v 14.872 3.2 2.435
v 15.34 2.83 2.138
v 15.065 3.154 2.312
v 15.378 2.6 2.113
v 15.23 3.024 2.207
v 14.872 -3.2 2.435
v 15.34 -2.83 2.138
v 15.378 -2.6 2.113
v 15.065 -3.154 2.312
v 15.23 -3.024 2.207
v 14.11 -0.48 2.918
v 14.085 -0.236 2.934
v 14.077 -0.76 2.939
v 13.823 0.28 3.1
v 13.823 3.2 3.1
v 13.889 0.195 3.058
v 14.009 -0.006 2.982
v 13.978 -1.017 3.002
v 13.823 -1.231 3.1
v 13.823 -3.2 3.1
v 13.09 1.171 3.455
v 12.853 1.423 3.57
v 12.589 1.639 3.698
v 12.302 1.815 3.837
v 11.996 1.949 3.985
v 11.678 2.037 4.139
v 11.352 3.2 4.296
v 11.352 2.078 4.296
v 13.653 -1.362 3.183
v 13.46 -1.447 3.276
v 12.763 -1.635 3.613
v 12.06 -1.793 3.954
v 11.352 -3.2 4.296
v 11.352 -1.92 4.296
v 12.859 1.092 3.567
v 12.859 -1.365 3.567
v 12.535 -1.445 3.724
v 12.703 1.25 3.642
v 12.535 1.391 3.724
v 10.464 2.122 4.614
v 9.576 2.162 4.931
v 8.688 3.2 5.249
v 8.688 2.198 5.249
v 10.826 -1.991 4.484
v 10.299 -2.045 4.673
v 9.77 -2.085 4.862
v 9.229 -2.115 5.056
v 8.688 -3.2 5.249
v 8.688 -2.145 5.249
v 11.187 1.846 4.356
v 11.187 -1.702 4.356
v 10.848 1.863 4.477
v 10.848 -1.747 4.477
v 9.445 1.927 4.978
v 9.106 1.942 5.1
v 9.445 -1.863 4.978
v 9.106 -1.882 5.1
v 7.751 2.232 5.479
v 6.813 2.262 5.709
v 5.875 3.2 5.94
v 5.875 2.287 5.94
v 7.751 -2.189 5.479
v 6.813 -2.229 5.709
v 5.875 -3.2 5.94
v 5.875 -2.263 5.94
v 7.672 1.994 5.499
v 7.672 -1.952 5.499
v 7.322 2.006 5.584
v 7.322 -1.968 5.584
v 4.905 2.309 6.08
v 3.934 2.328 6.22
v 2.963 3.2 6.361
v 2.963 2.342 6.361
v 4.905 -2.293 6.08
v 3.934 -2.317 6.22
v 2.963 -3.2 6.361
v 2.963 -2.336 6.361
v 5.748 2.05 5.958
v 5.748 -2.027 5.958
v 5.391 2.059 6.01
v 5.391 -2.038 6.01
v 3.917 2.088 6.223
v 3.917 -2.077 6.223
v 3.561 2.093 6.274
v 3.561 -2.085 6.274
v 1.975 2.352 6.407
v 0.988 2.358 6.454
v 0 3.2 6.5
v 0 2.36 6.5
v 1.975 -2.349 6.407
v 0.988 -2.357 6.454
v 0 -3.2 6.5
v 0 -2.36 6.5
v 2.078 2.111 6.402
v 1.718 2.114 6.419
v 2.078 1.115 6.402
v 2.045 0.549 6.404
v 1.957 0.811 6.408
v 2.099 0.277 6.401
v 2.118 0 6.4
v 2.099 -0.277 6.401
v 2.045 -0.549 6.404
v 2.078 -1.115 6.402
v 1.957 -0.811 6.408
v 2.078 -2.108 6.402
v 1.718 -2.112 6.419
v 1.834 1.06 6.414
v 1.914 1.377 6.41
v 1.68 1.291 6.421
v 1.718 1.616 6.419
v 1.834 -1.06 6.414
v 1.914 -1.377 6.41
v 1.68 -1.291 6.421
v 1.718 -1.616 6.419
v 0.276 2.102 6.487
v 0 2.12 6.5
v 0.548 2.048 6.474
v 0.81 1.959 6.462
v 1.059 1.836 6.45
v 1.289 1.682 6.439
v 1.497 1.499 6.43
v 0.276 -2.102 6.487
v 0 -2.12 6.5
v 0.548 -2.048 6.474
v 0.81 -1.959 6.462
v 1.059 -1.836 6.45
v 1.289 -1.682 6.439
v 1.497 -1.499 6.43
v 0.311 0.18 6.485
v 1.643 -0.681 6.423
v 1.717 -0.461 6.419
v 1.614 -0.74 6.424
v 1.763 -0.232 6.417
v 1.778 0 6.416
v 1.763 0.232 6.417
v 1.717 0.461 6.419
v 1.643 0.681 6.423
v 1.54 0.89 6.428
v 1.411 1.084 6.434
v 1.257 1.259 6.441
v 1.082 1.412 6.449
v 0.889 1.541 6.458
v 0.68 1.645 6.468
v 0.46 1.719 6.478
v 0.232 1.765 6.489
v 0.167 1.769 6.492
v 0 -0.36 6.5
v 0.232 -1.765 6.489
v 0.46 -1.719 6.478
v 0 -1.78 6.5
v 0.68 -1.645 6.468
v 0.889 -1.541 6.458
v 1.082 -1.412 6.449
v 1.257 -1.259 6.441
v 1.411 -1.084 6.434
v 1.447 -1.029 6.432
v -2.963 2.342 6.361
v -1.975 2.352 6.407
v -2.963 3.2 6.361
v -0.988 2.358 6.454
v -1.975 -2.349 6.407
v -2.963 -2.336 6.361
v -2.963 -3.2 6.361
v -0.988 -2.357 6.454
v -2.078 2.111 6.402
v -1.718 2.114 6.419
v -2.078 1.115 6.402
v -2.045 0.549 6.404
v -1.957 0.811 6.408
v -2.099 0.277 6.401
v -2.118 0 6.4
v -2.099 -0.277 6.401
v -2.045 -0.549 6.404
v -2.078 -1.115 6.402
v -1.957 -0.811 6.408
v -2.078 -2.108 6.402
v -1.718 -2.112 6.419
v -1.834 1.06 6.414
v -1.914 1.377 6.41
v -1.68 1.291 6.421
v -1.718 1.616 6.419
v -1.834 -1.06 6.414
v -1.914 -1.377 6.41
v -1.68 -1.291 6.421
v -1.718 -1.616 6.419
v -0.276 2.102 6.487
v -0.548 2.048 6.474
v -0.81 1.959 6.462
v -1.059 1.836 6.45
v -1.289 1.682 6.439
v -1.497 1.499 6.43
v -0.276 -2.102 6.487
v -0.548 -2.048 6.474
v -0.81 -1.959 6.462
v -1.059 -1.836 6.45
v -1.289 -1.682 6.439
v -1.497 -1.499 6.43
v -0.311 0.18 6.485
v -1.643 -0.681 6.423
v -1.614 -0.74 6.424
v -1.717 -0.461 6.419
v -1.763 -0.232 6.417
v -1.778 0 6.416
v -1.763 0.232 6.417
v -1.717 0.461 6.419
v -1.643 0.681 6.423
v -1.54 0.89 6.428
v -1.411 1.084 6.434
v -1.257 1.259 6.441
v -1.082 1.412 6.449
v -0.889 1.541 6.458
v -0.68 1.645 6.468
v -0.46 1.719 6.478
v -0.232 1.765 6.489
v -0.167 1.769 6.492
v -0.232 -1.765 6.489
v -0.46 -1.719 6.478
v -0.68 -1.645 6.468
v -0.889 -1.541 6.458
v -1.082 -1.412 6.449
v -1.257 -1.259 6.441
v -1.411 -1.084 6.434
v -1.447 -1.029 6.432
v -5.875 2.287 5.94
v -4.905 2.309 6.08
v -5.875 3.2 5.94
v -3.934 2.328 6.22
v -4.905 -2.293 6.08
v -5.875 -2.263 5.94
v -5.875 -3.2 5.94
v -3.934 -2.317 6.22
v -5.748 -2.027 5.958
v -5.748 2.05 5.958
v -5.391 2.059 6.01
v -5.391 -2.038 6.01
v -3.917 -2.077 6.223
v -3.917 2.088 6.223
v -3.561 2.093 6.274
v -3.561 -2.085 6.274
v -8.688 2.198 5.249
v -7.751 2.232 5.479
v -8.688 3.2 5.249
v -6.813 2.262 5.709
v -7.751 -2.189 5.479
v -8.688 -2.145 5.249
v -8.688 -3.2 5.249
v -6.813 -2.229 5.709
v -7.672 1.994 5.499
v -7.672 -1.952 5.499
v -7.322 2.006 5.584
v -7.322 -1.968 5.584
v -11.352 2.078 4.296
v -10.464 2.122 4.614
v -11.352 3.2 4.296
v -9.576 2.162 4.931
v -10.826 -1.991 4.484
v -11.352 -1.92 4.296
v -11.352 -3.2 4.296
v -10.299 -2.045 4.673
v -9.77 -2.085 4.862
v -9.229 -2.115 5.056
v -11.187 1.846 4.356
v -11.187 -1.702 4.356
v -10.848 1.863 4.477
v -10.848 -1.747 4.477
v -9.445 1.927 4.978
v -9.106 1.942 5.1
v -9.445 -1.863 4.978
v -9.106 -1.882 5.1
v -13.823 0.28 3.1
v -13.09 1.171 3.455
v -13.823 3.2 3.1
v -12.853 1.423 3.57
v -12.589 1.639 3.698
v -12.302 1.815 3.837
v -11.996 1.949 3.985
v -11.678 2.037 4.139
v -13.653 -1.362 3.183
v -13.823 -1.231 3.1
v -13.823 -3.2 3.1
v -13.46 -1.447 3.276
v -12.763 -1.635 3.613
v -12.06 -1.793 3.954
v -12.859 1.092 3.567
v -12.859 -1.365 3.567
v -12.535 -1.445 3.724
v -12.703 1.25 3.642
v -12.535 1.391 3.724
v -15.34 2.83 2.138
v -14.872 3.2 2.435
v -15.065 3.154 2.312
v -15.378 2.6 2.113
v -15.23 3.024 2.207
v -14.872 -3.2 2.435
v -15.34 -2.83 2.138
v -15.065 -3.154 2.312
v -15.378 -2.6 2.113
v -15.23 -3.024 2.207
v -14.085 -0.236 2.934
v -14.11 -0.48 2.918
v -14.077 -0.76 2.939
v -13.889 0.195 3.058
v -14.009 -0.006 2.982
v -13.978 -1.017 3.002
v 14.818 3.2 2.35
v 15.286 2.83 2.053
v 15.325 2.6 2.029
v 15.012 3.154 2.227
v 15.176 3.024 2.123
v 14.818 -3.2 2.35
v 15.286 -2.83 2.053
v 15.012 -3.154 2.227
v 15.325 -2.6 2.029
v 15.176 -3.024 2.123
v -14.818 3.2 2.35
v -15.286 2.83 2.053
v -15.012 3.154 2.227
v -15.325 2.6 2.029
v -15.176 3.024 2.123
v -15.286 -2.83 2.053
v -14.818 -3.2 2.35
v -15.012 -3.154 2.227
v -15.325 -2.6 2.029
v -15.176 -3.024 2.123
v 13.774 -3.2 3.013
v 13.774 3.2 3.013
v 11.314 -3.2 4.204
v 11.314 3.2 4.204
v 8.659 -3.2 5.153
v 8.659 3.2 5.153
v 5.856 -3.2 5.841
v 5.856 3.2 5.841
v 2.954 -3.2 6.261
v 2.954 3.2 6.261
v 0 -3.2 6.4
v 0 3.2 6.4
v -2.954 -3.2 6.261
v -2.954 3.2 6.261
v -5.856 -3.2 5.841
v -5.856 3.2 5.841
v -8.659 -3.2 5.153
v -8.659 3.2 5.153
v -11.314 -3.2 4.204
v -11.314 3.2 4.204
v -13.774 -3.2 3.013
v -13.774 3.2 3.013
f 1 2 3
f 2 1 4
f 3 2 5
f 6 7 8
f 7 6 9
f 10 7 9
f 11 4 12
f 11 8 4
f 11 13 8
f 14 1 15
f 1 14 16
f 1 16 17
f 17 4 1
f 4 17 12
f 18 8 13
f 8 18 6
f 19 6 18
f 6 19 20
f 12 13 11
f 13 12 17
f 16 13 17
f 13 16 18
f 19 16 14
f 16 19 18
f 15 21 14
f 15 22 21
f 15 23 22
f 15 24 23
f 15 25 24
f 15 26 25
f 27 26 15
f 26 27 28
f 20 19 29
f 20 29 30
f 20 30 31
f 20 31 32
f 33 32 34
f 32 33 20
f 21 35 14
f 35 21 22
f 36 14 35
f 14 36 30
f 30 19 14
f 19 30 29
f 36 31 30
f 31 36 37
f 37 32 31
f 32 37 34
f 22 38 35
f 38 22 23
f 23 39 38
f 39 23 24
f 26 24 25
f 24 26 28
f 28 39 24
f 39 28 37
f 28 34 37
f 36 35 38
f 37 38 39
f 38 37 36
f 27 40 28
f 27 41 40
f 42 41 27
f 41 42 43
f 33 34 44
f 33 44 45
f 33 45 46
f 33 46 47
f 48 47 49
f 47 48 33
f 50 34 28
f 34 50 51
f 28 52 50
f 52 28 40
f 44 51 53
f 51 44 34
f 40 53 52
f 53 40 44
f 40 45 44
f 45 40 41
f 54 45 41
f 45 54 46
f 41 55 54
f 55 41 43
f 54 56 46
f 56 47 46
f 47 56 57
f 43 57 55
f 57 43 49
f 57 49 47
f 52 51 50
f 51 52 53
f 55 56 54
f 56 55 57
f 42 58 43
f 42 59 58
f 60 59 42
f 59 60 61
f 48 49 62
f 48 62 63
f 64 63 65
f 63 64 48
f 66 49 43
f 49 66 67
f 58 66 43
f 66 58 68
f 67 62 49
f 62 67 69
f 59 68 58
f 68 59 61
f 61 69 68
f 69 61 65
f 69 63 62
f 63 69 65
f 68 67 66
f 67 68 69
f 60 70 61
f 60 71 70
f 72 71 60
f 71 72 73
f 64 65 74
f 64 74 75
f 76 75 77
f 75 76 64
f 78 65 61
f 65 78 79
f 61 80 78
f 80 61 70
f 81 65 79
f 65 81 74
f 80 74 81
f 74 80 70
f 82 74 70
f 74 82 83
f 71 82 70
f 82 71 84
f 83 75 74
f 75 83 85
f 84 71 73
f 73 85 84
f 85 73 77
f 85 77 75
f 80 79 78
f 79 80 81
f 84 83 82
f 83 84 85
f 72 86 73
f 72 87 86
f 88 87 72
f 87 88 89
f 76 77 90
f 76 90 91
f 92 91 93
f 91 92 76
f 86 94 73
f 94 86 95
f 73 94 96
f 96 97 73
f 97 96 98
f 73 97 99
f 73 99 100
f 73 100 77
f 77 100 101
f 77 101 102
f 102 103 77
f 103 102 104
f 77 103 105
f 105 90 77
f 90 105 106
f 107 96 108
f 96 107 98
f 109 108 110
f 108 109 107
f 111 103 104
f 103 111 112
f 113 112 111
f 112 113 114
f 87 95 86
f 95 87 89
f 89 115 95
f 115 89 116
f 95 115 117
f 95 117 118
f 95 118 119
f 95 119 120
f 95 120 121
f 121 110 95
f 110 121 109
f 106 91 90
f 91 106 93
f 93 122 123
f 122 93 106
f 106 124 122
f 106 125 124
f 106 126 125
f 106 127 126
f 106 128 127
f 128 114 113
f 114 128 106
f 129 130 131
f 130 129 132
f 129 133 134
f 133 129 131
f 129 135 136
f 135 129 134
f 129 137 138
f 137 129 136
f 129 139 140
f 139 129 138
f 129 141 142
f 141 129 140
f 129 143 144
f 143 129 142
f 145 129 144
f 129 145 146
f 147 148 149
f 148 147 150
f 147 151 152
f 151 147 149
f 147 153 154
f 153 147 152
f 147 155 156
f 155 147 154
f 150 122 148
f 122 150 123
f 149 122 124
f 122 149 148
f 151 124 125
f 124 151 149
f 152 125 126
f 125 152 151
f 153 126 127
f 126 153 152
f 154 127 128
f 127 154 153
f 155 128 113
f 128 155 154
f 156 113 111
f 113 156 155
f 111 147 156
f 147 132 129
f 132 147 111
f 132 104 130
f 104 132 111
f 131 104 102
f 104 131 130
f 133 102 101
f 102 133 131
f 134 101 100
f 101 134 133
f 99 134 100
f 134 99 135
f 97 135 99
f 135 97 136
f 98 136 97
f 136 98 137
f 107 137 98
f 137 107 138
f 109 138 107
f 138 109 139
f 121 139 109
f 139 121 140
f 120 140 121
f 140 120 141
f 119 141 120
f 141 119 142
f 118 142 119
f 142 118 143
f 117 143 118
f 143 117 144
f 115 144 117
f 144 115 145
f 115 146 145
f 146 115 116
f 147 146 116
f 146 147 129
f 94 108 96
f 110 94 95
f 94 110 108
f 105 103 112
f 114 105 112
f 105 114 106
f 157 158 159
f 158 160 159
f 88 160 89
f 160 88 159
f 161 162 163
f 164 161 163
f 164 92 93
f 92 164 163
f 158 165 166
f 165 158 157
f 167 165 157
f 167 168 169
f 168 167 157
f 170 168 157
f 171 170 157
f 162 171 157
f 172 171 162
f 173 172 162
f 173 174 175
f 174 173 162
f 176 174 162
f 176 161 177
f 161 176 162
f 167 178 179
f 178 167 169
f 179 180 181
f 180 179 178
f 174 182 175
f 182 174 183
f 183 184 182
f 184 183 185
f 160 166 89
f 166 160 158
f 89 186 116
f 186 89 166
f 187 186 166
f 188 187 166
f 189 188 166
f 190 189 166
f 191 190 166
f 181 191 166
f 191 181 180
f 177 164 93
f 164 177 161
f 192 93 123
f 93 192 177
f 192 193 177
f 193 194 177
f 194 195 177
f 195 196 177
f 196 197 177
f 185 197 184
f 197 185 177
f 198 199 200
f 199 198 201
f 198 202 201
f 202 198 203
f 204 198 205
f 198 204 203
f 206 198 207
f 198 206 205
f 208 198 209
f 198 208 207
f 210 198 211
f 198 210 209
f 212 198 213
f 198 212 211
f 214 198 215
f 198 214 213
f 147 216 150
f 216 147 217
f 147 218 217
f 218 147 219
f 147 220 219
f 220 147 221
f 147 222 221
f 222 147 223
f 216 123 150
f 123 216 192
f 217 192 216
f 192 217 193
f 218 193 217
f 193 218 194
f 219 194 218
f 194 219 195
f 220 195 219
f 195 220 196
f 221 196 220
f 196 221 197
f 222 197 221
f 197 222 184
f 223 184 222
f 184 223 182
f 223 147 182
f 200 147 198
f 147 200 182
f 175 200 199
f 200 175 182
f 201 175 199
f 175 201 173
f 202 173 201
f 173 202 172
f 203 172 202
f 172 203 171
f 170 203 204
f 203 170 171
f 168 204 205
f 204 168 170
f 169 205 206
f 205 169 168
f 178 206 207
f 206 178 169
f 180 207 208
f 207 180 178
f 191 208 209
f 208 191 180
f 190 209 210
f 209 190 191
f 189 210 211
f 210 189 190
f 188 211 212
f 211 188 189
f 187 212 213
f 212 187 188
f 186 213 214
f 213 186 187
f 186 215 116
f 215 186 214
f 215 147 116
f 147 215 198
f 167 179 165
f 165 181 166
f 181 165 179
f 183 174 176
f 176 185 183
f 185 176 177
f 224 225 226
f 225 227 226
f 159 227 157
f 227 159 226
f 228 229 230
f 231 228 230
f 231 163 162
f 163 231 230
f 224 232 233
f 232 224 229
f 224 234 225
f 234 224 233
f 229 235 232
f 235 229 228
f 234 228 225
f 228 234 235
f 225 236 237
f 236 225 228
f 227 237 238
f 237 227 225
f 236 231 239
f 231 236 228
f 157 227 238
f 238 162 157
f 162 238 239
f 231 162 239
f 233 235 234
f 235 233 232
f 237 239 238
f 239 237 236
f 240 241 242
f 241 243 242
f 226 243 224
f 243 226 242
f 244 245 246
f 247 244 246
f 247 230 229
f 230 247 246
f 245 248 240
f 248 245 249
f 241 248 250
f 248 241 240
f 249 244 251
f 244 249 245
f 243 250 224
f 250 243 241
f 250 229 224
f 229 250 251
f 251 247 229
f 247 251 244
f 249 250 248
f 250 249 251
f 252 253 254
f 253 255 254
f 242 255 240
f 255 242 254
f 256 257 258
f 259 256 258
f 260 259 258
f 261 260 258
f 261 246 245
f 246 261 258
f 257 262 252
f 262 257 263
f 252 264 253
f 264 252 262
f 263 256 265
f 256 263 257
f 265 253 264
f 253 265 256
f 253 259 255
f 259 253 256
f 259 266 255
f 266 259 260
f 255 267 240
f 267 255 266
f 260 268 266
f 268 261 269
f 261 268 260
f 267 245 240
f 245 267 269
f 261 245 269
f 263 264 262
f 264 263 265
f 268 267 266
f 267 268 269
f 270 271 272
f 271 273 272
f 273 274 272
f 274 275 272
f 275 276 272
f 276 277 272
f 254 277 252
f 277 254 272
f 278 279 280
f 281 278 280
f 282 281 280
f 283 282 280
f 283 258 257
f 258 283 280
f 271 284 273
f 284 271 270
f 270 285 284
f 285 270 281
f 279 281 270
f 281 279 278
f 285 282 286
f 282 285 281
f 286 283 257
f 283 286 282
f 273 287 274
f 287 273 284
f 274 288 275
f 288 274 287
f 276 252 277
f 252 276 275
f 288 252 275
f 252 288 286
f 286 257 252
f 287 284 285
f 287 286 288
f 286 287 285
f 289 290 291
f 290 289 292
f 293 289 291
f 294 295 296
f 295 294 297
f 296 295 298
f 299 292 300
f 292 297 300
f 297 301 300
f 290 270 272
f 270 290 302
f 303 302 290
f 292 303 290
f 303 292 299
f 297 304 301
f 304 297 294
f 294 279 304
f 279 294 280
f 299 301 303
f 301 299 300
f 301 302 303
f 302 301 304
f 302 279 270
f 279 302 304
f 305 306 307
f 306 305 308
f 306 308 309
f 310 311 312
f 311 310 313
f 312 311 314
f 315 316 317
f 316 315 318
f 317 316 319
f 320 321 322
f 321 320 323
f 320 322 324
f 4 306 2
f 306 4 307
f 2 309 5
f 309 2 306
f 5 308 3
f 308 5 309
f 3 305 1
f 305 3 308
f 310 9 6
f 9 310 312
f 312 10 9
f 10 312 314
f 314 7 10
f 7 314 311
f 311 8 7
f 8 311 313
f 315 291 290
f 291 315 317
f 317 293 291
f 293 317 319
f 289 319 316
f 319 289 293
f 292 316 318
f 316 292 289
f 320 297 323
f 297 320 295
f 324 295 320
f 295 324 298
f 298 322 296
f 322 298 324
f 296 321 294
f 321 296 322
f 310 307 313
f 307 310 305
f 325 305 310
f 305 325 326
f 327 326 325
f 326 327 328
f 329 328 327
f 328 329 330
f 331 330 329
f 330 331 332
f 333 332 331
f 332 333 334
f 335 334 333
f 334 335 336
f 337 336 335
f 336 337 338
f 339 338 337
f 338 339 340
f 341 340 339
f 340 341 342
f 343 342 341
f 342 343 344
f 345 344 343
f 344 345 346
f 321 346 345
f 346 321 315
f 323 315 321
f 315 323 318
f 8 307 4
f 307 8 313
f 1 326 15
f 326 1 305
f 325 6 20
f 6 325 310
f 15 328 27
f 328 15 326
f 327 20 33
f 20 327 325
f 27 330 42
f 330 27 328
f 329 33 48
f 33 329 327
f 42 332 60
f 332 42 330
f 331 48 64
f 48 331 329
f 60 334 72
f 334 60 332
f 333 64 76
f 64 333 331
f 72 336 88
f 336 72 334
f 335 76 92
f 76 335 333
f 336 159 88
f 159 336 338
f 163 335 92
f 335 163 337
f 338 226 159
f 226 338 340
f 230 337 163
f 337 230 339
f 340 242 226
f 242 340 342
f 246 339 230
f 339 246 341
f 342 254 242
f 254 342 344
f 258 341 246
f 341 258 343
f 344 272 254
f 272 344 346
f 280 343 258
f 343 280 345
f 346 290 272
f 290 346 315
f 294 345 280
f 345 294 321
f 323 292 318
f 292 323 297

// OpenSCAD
// file: ../p/1-4cyli.scad
use <../lib.scad>
function ldraw_lib__1_4cyli() = [
// 0 Cylinder 0.25
// 0 Name: 1-4cyli.dat
// 0 Author: James Jessiman
// 0 !LDRAW_ORG Primitive UPDATE 2012-01
// 0 !LICENSE Licensed under CC BY 4.0 : see CAreadme.txt
// 
// 0 BFC CERTIFY CCW
  [0,"BFC","CERTIFY"],
  [0,"BFC","CCW"],
// 
// 0 !HISTORY 2002-03-23 [sbliss] Added BFC statement.
// 0 !HISTORY 2002-04-25 [PTadmin] Official Update 2002-02
// 0 !HISTORY 2007-06-22 [PTadmin] Header formatted for Contributor Agreement
// 0 !HISTORY 2008-07-01 [PTadmin] Official Update 2008-01
// 0 !HISTORY 2012-02-16 [Philo] Changed to CCW
// 0 !HISTORY 2012-03-30 [PTadmin] Official Update 2012-01
// 
// 
// 4 16 1 1 0 0.9239 1 0.3827 0.9239 0 0.3827 1 0 0
  [4,16,1,1,0,0.9239,1,0.3827,0.9239,0,0.3827,1,0,0],
// 5 24 1 0 0 1 1 0 0.9239 0 0.3827 1 0 -1
  [5,24,1,0,0,1,1,0,0.9239,0,0.3827,1,0,-1],
// 4 16 0.9239 1 0.3827 0.7071 1 0.7071 0.7071 0 0.7071 0.9239 0 0.3827
  [4,16,0.9239,1,0.3827,0.7071,1,0.7071,0.7071,0,0.7071,0.9239,0,0.3827],
// 5 24 0.9239 0 0.3827 0.9239 1 0.3827 0.7071 0 0.7071 1 0 0
  [5,24,0.9239,0,0.3827,0.9239,1,0.3827,0.7071,0,0.7071,1,0,0],
// 4 16 0.7071 1 0.7071 0.3827 1 0.9239 0.3827 0 0.9239 0.7071 0 0.7071
  [4,16,0.7071,1,0.7071,0.3827,1,0.9239,0.3827,0,0.9239,0.7071,0,0.7071],
// 5 24 0.7071 0 0.7071 0.7071 1 0.7071 0.3827 0 0.9239 0.9239 0 0.3827
  [5,24,0.7071,0,0.7071,0.7071,1,0.7071,0.3827,0,0.9239,0.9239,0,0.3827],
// 4 16 0.3827 1 0.9239 0 1 1 0 0 1 0.3827 0 0.9239
  [4,16,0.3827,1,0.9239,0,1,1,0,0,1,0.3827,0,0.9239],
// 5 24 0.3827 0 0.9239 0.3827 1 0.9239 0 0 1 0.7071 0 0.7071
  [5,24,0.3827,0,0.9239,0.3827,1,0.9239,0,0,1,0.7071,0,0.7071],
// 5 24 0 0 1 0 1 1 0.3827 0 0.9239 -1 0 1
  [5,24,0,0,1,0,1,1,0.3827,0,0.9239,-1,0,1],
];
module ldraw_lib__1_4cyli(step=0, col=false, unit=2/5, alt=false, line=0.2, solid=!$preview)
    makepoly(ldraw_lib__1_4cyli(), step=step, col=col, unit=unit, alt=alt, line=line, solid=solid);
ldraw_lib__1_4cyli(line=0.2);
// file: ../p/1-4chrd.scad
use <../lib.scad>
function ldraw_lib__1_4chrd() = [
// 0 Chord 0.25
// 0 Name: 1-4chrd.dat
// 0 Author: Max Martin Richter [MMR1988]
// 0 !LDRAW_ORG Primitive UPDATE 2023-05
// 0 !LICENSE Licensed under CC BY 4.0 : see CAreadme.txt
// 
// 0 BFC CERTIFY CCW
  [0,"BFC","CERTIFY"],
  [0,"BFC","CCW"],
// 
// 0 !HISTORY 2004-04-22 [PTadmin] Official Update 2004-02
// 0 !HISTORY 2007-10-09 [PTadmin] Header formatted for Contributor Agreement
// 0 !HISTORY 2008-07-01 [PTadmin] Official Update 2008-01
// 0 !HISTORY 2012-08-02 [MMR1988] Re-creation with PrimGen2 and Rectifier
// 0 !HISTORY 2012-08-09 [PTadmin] Official Update 2012-02
// 0 !HISTORY 2023-10-27 [OrionP] Change author to MMR1988 from hafhead
// 0 !HISTORY 2023-10-31 [OrionP] Official Update 2023-05
// 
// 4 16 0.9239 0 0.3827 0.3827 0 0.9239 0 0 1 1 0 0
  [4,16,0.9239,0,0.3827,0.3827,0,0.9239,0,0,1,1,0,0],
// 3 16 0.7071 0 0.7071 0.3827 0 0.9239 0.9239 0 0.3827
  [3,16,0.7071,0,0.7071,0.3827,0,0.9239,0.9239,0,0.3827],
];
module ldraw_lib__1_4chrd(step=0, col=false, unit=2/5, alt=false, line=0.2, solid=!$preview)
    makepoly(ldraw_lib__1_4chrd(), step=step, col=col, unit=unit, alt=alt, line=line, solid=solid);
ldraw_lib__1_4chrd(line=0.2);
// file: s/6177741ps05.scad
use <../../lib.scad>
function ldraw_lib__s__6177741ps05() = [
// 0 ~Sticker  0.8 x  4.1 with Front Grille with Vertical Lines on Transparent Background - Fifth Face
// 0 Name: s\6177741ps05.dat
// 0 Author: Massimo Maso [Sirio]
// 0 !LDRAW_ORG Subpart UPDATE 2025-05
// 0 !LICENSE Licensed under CC BY 4.0 : see CAreadme.txt
// 
// 0 BFC CERTIFY CCW
  [0,"BFC","CERTIFY"],
  [0,"BFC","CCW"],
// 
// 0 !HISTORY 2025-05-28 [OrionP] Official Update 2025-05
// 
// 
// 0 // Transparent faces
// 3 16 -8 -.25 7.3436 -5.7735 -.25 4.8919 -5.7181 -.25 7.3436
  [3,16,-8,-.25,7.3436,-5.7735,-.25,4.8919,-5.7181,-.25,7.3436],
// 3 16 -8 -.25 7.3436 -5.8188 -.25 2.44 -5.7735 -.25 4.8919
  [3,16,-8,-.25,7.3436,-5.8188,-.25,2.44,-5.7735,-.25,4.8919],
// 4 16 -8 -.25 7.3436 -8 -.25 -.0121 -5.8542 -.25 -.0121 -5.8188 -.25 2.44
  [4,16,-8,-.25,7.3436,-8,-.25,-.0121,-5.8542,-.25,-.0121,-5.8188,-.25,2.44],
// 3 16 8 -.25 7.3436 5.6575 -.25 7.3436 5.7313 -.25 4.892
  [3,16,8,-.25,7.3436,5.6575,-.25,7.3436,5.7313,-.25,4.892],
// 3 16 8 -.25 7.3436 5.7313 -.25 4.892 5.7918 -.25 2.4401
  [3,16,8,-.25,7.3436,5.7313,-.25,4.892,5.7918,-.25,2.4401],
// 4 16 8 -.25 7.3436 5.7918 -.25 2.4401 5.8389 -.25 -.0121 8 -.25 -.0121
  [4,16,8,-.25,7.3436,5.7918,-.25,2.4401,5.8389,-.25,-.0121,8,-.25,-.0121],
// 0 BFC NOCLIP
  [0,"BFC","NOCLIP"],
// 0 // Black faces
// 4 0 -5.1258 -.25 7.0219 5.0676 -.25 7.0219 5.6575 -.25 7.3436 -5.7181 -.25 7.3436
  [4,0,-5.1258,-.25,7.0219,5.0676,-.25,7.0219,5.6575,-.25,7.3436,-5.7181,-.25,7.3436],
// 4 0 -5.1258 -.25 7.0219 -5.7181 -.25 7.3436 -5.7735 -.25 4.8919 -5.1468 -.25 6.1219
  [4,0,-5.1258,-.25,7.0219,-5.7181,-.25,7.3436,-5.7735,-.25,4.8919,-5.1468,-.25,6.1219],
// 4 0 5.0676 -.25 7.0219 5.0957 -.25 6.1219 5.7313 -.25 4.892 5.6575 -.25 7.3436
  [4,0,5.0676,-.25,7.0219,5.0957,-.25,6.1219,5.7313,-.25,4.892,5.6575,-.25,7.3436],
// 4 0 -5.7735 -.25 4.8919 5.7313 -.25 4.892 5.0957 -.25 6.1219 -5.1468 -.25 6.1219
  [4,0,-5.7735,-.25,4.8919,5.7313,-.25,4.892,5.0957,-.25,6.1219,-5.1468,-.25,6.1219],
// 4 0 -5.7735 -.25 4.8919 -5.2195 -.25 2.3969 5.1926 -.25 2.3969 5.7313 -.25 4.892
  [4,0,-5.7735,-.25,4.8919,-5.2195,-.25,2.3969,5.1926,-.25,2.3969,5.7313,-.25,4.892],
// 4 0 -5.7735 -.25 4.8919 -5.8188 -.25 2.44 -5.2336 -.25 1.4969 -5.2195 -.25 2.3969
  [4,0,-5.7735,-.25,4.8919,-5.8188,-.25,2.44,-5.2336,-.25,1.4969,-5.2195,-.25,2.3969],
// 4 0 5.7313 -.25 4.892 5.1926 -.25 2.3969 5.2114 -.25 1.4969 5.7918 -.25 2.4401
  [4,0,5.7313,-.25,4.892,5.1926,-.25,2.3969,5.2114,-.25,1.4969,5.7918,-.25,2.4401],
// 3 0 -5.2336 -.25 1.4969 -5.8188 -.25 2.44 -5.8542 -.25 -.0121
  [3,0,-5.2336,-.25,1.4969,-5.8188,-.25,2.44,-5.8542,-.25,-.0121],
// 4 0 -5.2336 -.25 1.4969 -5.8542 -.25 -.0121 5.8389 -.25 -.0121 5.2114 -.25 1.4969
  [4,0,-5.2336,-.25,1.4969,-5.8542,-.25,-.0121,5.8389,-.25,-.0121,5.2114,-.25,1.4969],
// 3 0 5.2114 -.25 1.4969 5.8389 -.25 -.0121 5.7918 -.25 2.4401
  [3,0,5.2114,-.25,1.4969,5.8389,-.25,-.0121,5.7918,-.25,2.4401],
// 0 // Silver faces
// 4 80 -5.1258 -.25 7.0219 -5.1468 -.25 6.1219 5.0957 -.25 6.1219 5.0676 -.25 7.0219
  [4,80,-5.1258,-.25,7.0219,-5.1468,-.25,6.1219,5.0957,-.25,6.1219,5.0676,-.25,7.0219],
// 4 80 -5.2195 -.25 2.3969 -5.2336 -.25 1.4969 5.2114 -.25 1.4969 5.1926 -.25 2.3969
  [4,80,-5.2195,-.25,2.3969,-5.2336,-.25,1.4969,5.2114,-.25,1.4969,5.1926,-.25,2.3969],
];
module ldraw_lib__s__6177741ps05(step=0, col=false, unit=2/5, alt=false, line=0.2, solid=!$preview)
    makepoly(ldraw_lib__s__6177741ps05(), step=step, col=col, unit=unit, alt=alt, line=line, solid=solid);
ldraw_lib__s__6177741ps05(line=0.2);
// file: s/6177741ps04.scad
use <../../lib.scad>
function ldraw_lib__s__6177741ps04() = [
// 0 ~Sticker  0.8 x  4.1 with Front Grille with Vertical Lines on Transparent Background - Fourth Face
// 0 Name: s\6177741ps04.dat
// 0 Author: Massimo Maso [Sirio]
// 0 !LDRAW_ORG Subpart UPDATE 2025-05
// 0 !LICENSE Licensed under CC BY 4.0 : see CAreadme.txt
// 
// 0 BFC CERTIFY CCW
  [0,"BFC","CERTIFY"],
  [0,"BFC","CCW"],
// 
// 0 !HISTORY 2025-05-28 [OrionP] Official Update 2025-05
// 
// 
// 0 // Transparent faces
// 3 16 -8 -.25 .0128 -5.5798 -.25 -2.4006 -5.4961 -.25 .0128
  [3,16,-8,-.25,.0128,-5.5798,-.25,-2.4006,-5.4961,-.25,.0128],
// 3 16 -8 -.25 .0128 -5.6538 -.25 -4.8144 -5.5798 -.25 -2.4006
  [3,16,-8,-.25,.0128,-5.6538,-.25,-4.8144,-5.5798,-.25,-2.4006],
// 4 16 -8 -.25 .0128 -8 -.25 -7.2284 -5.7181 -.25 -7.2284 -5.6538 -.25 -4.8144
  [4,16,-8,-.25,.0128,-8,-.25,-7.2284,-5.7181,-.25,-7.2284,-5.6538,-.25,-4.8144],
// 3 16 8 -.25 .0128 5.3613 -.25 .0128 5.473 -.25 -2.4004
  [3,16,8,-.25,.0128,5.3613,-.25,.0128,5.473,-.25,-2.4004],
// 3 16 8 -.25 .0128 5.473 -.25 -2.4004 5.5717 -.25 -4.8141
  [3,16,8,-.25,.0128,5.473,-.25,-2.4004,5.5717,-.25,-4.8141],
// 4 16 8 -.25 .0128 5.5717 -.25 -4.8141 5.6575 -.25 -7.2284 8 -.25 -7.2284
  [4,16,8,-.25,.0128,5.5717,-.25,-4.8141,5.6575,-.25,-7.2284,8,-.25,-7.2284],
// 0 BFC NOCLIP
  [0,"BFC","NOCLIP"],
// 0 // Black faces
// 4 0 -4.9861 -.25 -2.6034 4.8812 -.25 -2.6034 5.3613 -.25 .0128 -5.4961 -.25 .0128
  [4,0,-4.9861,-.25,-2.6034,4.8812,-.25,-2.6034,5.3613,-.25,.0128,-5.4961,-.25,.0128],
// 4 0 -4.9861 -.25 -2.6034 -5.4961 -.25 .0128 -5.5798 -.25 -2.4006 -5.0145 -.25 -3.5034
  [4,0,-4.9861,-.25,-2.6034,-5.4961,-.25,.0128,-5.5798,-.25,-2.4006,-5.0145,-.25,-3.5034],
// 4 0 4.8812 -.25 -2.6034 4.9192 -.25 -3.5034 5.473 -.25 -2.4004 5.3613 -.25 .0128
  [4,0,4.8812,-.25,-2.6034,4.9192,-.25,-3.5034,5.473,-.25,-2.4004,5.3613,-.25,.0128],
// 4 0 -5.0145 -.25 -3.5034 -5.5798 -.25 -2.4006 -5.6538 -.25 -4.8144 -5.7181 -.25 -7.2284
  [4,0,-5.0145,-.25,-3.5034,-5.5798,-.25,-2.4006,-5.6538,-.25,-4.8144,-5.7181,-.25,-7.2284],
// 4 0 -5.0145 -.25 -3.5034 -5.7181 -.25 -7.2284 5.6575 -.25 -7.2284 4.9192 -.25 -3.5034
  [4,0,-5.0145,-.25,-3.5034,-5.7181,-.25,-7.2284,5.6575,-.25,-7.2284,4.9192,-.25,-3.5034],
// 4 0 4.9192 -.25 -3.5034 5.6575 -.25 -7.2284 5.5717 -.25 -4.8141 5.473 -.25 -2.4004
  [4,0,4.9192,-.25,-3.5034,5.6575,-.25,-7.2284,5.5717,-.25,-4.8141,5.473,-.25,-2.4004],
// 0 // Silver face
// 4 80 -4.9861 -.25 -2.6034 -5.0145 -.25 -3.5034 4.9192 -.25 -3.5034 4.8812 -.25 -2.6034
  [4,80,-4.9861,-.25,-2.6034,-5.0145,-.25,-3.5034,4.9192,-.25,-3.5034,4.8812,-.25,-2.6034],
];
module ldraw_lib__s__6177741ps04(step=0, col=false, unit=2/5, alt=false, line=0.2, solid=!$preview)
    makepoly(ldraw_lib__s__6177741ps04(), step=step, col=col, unit=unit, alt=alt, line=line, solid=solid);
ldraw_lib__s__6177741ps04(line=0.2);
// file: s/6177741ps03.scad
use <../../lib.scad>
function ldraw_lib__s__6177741ps03() = [
// 0 ~Sticker  0.8 x  4.1 with Front Grille with Vertical Lines on Transparent Background - Third Face
// 0 Name: s\6177741ps03.dat
// 0 Author: Massimo Maso [Sirio]
// 0 !LDRAW_ORG Subpart UPDATE 2025-05
// 0 !LICENSE Licensed under CC BY 4.0 : see CAreadme.txt
// 
// 0 BFC CERTIFY CCW
  [0,"BFC","CERTIFY"],
  [0,"BFC","CCW"],
// 
// 0 !HISTORY 2025-05-28 [OrionP] Official Update 2025-05
// 
// 
// 0 // Transparent faces
// 3 16 -8 -.25 7.0609 -5.3043 -.25 4.7034 -5.1946 -.25 7.0609
  [3,16,-8,-.25,7.0609,-5.3043,-.25,4.7034,-5.1946,-.25,7.0609],
// 3 16 -8 -.25 7.0609 -5.4048 -.25 2.3455 -5.3043 -.25 4.7034
  [3,16,-8,-.25,7.0609,-5.4048,-.25,2.3455,-5.3043,-.25,4.7034],
// 4 16 -8 -.25 7.0609 -8 -.25 -.0128 -5.4961 -.25 -.0128 -5.4048 -.25 2.3455
  [4,16,-8,-.25,7.0609,-8,-.25,-.0128,-5.4961,-.25,-.0128,-5.4048,-.25,2.3455],
// 3 16 8 -.25 7.0609 4.8003 -.25 7.0609 4.9767 -.25 5.6648
  [3,16,8,-.25,7.0609,4.8003,-.25,7.0609,4.9767,-.25,5.6648],
// 3 16 8 -.25 7.0609 4.9767 -.25 5.6648 5.1137 -.25 4.2644
  [3,16,8,-.25,7.0609,4.9767,-.25,5.6648,5.1137,-.25,4.2644],
// 3 16 8 -.25 7.0609 5.1137 -.25 4.2644 5.2113 -.25 2.8606
  [3,16,8,-.25,7.0609,5.1137,-.25,4.2644,5.2113,-.25,2.8606],
// 3 16 8 -.25 7.0609 5.2113 -.25 2.8606 5.2886 -.25 1.424
  [3,16,8,-.25,7.0609,5.2113,-.25,2.8606,5.2886,-.25,1.424],
// 4 16 8 -.25 7.0609 5.2886 -.25 1.424 5.3613 -.25 -.0128 8 -.25 -.0128
  [4,16,8,-.25,7.0609,5.2886,-.25,1.424,5.3613,-.25,-.0128,8,-.25,-.0128],
// 0 BFC NOCLIP
  [0,"BFC","NOCLIP"],
// 0 // Black faces
// 4 0 -4.6151 -.25 6.621 4.255 -.25 6.621 4.8003 -.25 7.0609 -5.1946 -.25 7.0609
  [4,0,-4.6151,-.25,6.621,4.255,-.25,6.621,4.8003,-.25,7.0609,-5.1946,-.25,7.0609],
// 4 0 -4.6151 -.25 6.621 -5.1946 -.25 7.0609 -5.3043 -.25 4.7034 -4.6574 -.25 5.721
  [4,0,-4.6151,-.25,6.621,-5.1946,-.25,7.0609,-5.3043,-.25,4.7034,-4.6574,-.25,5.721],
// 4 0 4.255 -.25 6.621 4.3665 -.25 5.721 4.9767 -.25 5.6648 4.8003 -.25 7.0609
  [4,0,4.255,-.25,6.621,4.3665,-.25,5.721,4.9767,-.25,5.6648,4.8003,-.25,7.0609],
// 4 0 -5.3043 -.25 4.7034 4.9767 -.25 5.6648 4.3665 -.25 5.721 -4.6574 -.25 5.721
  [4,0,-5.3043,-.25,4.7034,4.9767,-.25,5.6648,4.3665,-.25,5.721,-4.6574,-.25,5.721],
// 4 0 -5.3043 -.25 4.7034 -5.4048 -.25 2.3455 5.1137 -.25 4.2644 4.9767 -.25 5.6648
  [4,0,-5.3043,-.25,4.7034,-5.4048,-.25,2.3455,5.1137,-.25,4.2644,4.9767,-.25,5.6648],
// 4 0 -4.8185 -.25 1.996 5.2113 -.25 2.8606 5.1137 -.25 4.2644 -5.4048 -.25 2.3455
  [4,0,-4.8185,-.25,1.996,5.2113,-.25,2.8606,5.1137,-.25,4.2644,-5.4048,-.25,2.3455],
// 4 0 -4.8185 -.25 1.996 -5.4048 -.25 2.3455 -5.4961 -.25 -.0128 -4.8539 -.25 1.096
  [4,0,-4.8185,-.25,1.996,-5.4048,-.25,2.3455,-5.4961,-.25,-.0128,-4.8539,-.25,1.096],
// 3 0 -4.8185 -.25 1.996 4.6575 -.25 1.996 5.2113 -.25 2.8606
  [3,0,-4.8185,-.25,1.996,4.6575,-.25,1.996,5.2113,-.25,2.8606],
// 4 0 4.7048 -.25 1.096 5.2886 -.25 1.424 5.2113 -.25 2.8606 4.6575 -.25 1.996
  [4,0,4.7048,-.25,1.096,5.2886,-.25,1.424,5.2113,-.25,2.8606,4.6575,-.25,1.996],
// 4 0 4.7048 -.25 1.096 -4.8539 -.25 1.096 -5.4961 -.25 -.0128 5.3613 -.25 -.0128
  [4,0,4.7048,-.25,1.096,-4.8539,-.25,1.096,-5.4961,-.25,-.0128,5.3613,-.25,-.0128],
// 3 0 4.7048 -.25 1.096 5.3613 -.25 -.0128 5.2886 -.25 1.424
  [3,0,4.7048,-.25,1.096,5.3613,-.25,-.0128,5.2886,-.25,1.424],
// 0 // Silver faces
// 4 80 -4.6151 -.25 6.621 -4.6574 -.25 5.721 4.3665 -.25 5.721 4.255 -.25 6.621
  [4,80,-4.6151,-.25,6.621,-4.6574,-.25,5.721,4.3665,-.25,5.721,4.255,-.25,6.621],
// 4 80 -4.8185 -.25 1.996 -4.8539 -.25 1.096 4.7048 -.25 1.096 4.6575 -.25 1.996
  [4,80,-4.8185,-.25,1.996,-4.8539,-.25,1.096,4.7048,-.25,1.096,4.6575,-.25,1.996],
];
module ldraw_lib__s__6177741ps03(step=0, col=false, unit=2/5, alt=false, line=0.2, solid=!$preview)
    makepoly(ldraw_lib__s__6177741ps03(), step=step, col=col, unit=unit, alt=alt, line=line, solid=solid);
ldraw_lib__s__6177741ps03(line=0.2);
// file: s/6177741ps02.scad
use <../../lib.scad>
function ldraw_lib__s__6177741ps02() = [
// 0 ~Sticker  0.8 x  4.1 with Front Grille with Vertical Lines on Transparent Background - Second Face
// 0 Name: s\6177741ps02.dat
// 0 Author: Massimo Maso [Sirio]
// 0 !LDRAW_ORG Subpart UPDATE 2025-05
// 0 !LICENSE Licensed under CC BY 4.0 : see CAreadme.txt
// 
// 0 BFC CERTIFY CCW
  [0,"BFC","CERTIFY"],
  [0,"BFC","CCW"],
// 
// 0 !HISTORY 2025-05-28 [OrionP] Official Update 2025-05
// 
// 
// 0 // Transparent faces
// 3 16 -8 -.25 .0144 -2.9278 -.25 -2.0231 -.7008 -.25 .0144
  [3,16,-8,-.25,.0144,-2.9278,-.25,-2.0231,-.7008,-.25,.0144],
// 3 16 -8 -.25 .0144 -3.5585 -.25 -2.6803 -2.9278 -.25 -2.0231
  [3,16,-8,-.25,.0144,-3.5585,-.25,-2.6803,-2.9278,-.25,-2.0231],
// 3 16 -8 -.25 .0144 -4.0984 -.25 -3.414 -3.5585 -.25 -2.6803
  [3,16,-8,-.25,.0144,-4.0984,-.25,-3.414,-3.5585,-.25,-2.6803],
// 3 16 -8 -.25 .0144 -4.5386 -.25 -4.2115 -4.0984 -.25 -3.414
  [3,16,-8,-.25,.0144,-4.5386,-.25,-4.2115,-4.0984,-.25,-3.414],
// 3 16 -8 -.25 .0144 -4.8714 -.25 -5.0594 -4.5386 -.25 -4.2115
  [3,16,-8,-.25,.0144,-4.8714,-.25,-5.0594,-4.5386,-.25,-4.2115],
// 3 16 -8 -.25 .0144 -5.0913 -.25 -5.9434 -4.8714 -.25 -5.0594
  [3,16,-8,-.25,.0144,-5.0913,-.25,-5.9434,-4.8714,-.25,-5.0594],
// 4 16 -8 -.25 .0144 -8 -.25 -6.8484 -5.1946 -.25 -6.8484 -5.0913 -.25 -5.9434
  [4,16,-8,-.25,.0144,-8,-.25,-6.8484,-5.1946,-.25,-6.8484,-5.0913,-.25,-5.9434],
// 3 16 8 -.25 .0144 3.0787 -.25 .0144 3.406 -.25 -.4587
  [3,16,8,-.25,.0144,3.0787,-.25,.0144,3.406,-.25,-.4587],
// 3 16 8 -.25 .0144 3.406 -.25 -.4587 3.6164 -.25 -.994
  [3,16,8,-.25,.0144,3.406,-.25,-.4587,3.6164,-.25,-.994],
// 3 16 8 -.25 .0144 3.6164 -.25 -.994 4.0887 -.25 -2.9292
  [3,16,8,-.25,.0144,3.6164,-.25,-.994,4.0887,-.25,-2.9292],
// 3 16 8 -.25 .0144 4.0887 -.25 -2.9292 4.4836 -.25 -4.8817
  [3,16,8,-.25,.0144,4.0887,-.25,-2.9292,4.4836,-.25,-4.8817],
// 4 16 8 -.25 .0144 4.4836 -.25 -4.8817 4.8003 -.25 -6.8484 8 -.25 -6.8484
  [4,16,8,-.25,.0144,4.4836,-.25,-4.8817,4.8003,-.25,-6.8484,8,-.25,-6.8484],
// 0 BFC NOCLIP
  [0,"BFC","NOCLIP"],
// 0 // Black faces
// 4 0 -.7008 -.25 .0144 -2.9278 -.25 -2.0231 -3.5585 -.25 -2.6803 -2.7293 -.25 -2.6633
  [4,0,-.7008,-.25,.0144,-2.9278,-.25,-2.0231,-3.5585,-.25,-2.6803,-2.7293,-.25,-2.6633],
// 4 0 -.7008 -.25 .0144 -2.7293 -.25 -2.6633 3.4129 -.25 -2.6633 3.6164 -.25 -.994
  [4,0,-.7008,-.25,.0144,-2.7293,-.25,-2.6633,3.4129,-.25,-2.6633,3.6164,-.25,-.994],
// 4 0 -.7008 -.25 .0144 3.6164 -.25 -.994 3.406 -.25 -.4587 3.0787 -.25 .0144
  [4,0,-.7008,-.25,.0144,3.6164,-.25,-.994,3.406,-.25,-.4587,3.0787,-.25,.0144],
// 4 0 4.0887 -.25 -2.9292 3.6164 -.25 -.994 3.4129 -.25 -2.6633 3.6126 -.25 -3.5633
  [4,0,4.0887,-.25,-2.9292,3.6164,-.25,-.994,3.4129,-.25,-2.6633,3.6126,-.25,-3.5633],
// 4 0 4.0887 -.25 -2.9292 3.6126 -.25 -3.5633 4.8003 -.25 -6.8484 4.4836 -.25 -4.8817
  [4,0,4.0887,-.25,-2.9292,3.6126,-.25,-3.5633,4.8003,-.25,-6.8484,4.4836,-.25,-4.8817],
// 4 0 -4.0984 -.25 -3.414 -3.1241 -.25 -3.0962 -2.7293 -.25 -2.6633 -3.5585 -.25 -2.6803
  [4,0,-4.0984,-.25,-3.414,-3.1241,-.25,-3.0962,-2.7293,-.25,-2.6633,-3.5585,-.25,-2.6803],
// 4 0 -4.0984 -.25 -3.414 -4.5386 -.25 -4.2115 -3.4776 -.25 -3.5633 -3.1241 -.25 -3.0962
  [4,0,-4.0984,-.25,-3.414,-4.5386,-.25,-4.2115,-3.4776,-.25,-3.5633,-3.1241,-.25,-3.0962],
// 4 0 -5.1946 -.25 -6.8484 -4.5386 -.25 -4.2115 -4.8714 -.25 -5.0594 -5.0913 -.25 -5.9434
  [4,0,-5.1946,-.25,-6.8484,-4.5386,-.25,-4.2115,-4.8714,-.25,-5.0594,-5.0913,-.25,-5.9434],
// 4 0 -5.1946 -.25 -6.8484 3.6126 -.25 -3.5633 -3.4776 -.25 -3.5633 -4.5386 -.25 -4.2115
  [4,0,-5.1946,-.25,-6.8484,3.6126,-.25,-3.5633,-3.4776,-.25,-3.5633,-4.5386,-.25,-4.2115],
// 3 0 -5.1946 -.25 -6.8484 4.8003 -.25 -6.8484 3.6126 -.25 -3.5633
  [3,0,-5.1946,-.25,-6.8484,4.8003,-.25,-6.8484,3.6126,-.25,-3.5633],
// 0 // Silver faces
// 3 80 3.4129 -.25 -2.6633 -2.7293 -.25 -2.6633 -3.1241 -.25 -3.0962
  [3,80,3.4129,-.25,-2.6633,-2.7293,-.25,-2.6633,-3.1241,-.25,-3.0962],
// 4 80 3.4129 -.25 -2.6633 -3.1241 -.25 -3.0962 -3.4776 -.25 -3.5633 3.6126 -.25 -3.5633
  [4,80,3.4129,-.25,-2.6633,-3.1241,-.25,-3.0962,-3.4776,-.25,-3.5633,3.6126,-.25,-3.5633],
];
module ldraw_lib__s__6177741ps02(step=0, col=false, unit=2/5, alt=false, line=0.2, solid=!$preview)
    makepoly(ldraw_lib__s__6177741ps02(), step=step, col=col, unit=unit, alt=alt, line=line, solid=solid);
ldraw_lib__s__6177741ps02(line=0.2);
// file: s/6177741ps01.scad
use <../../lib.scad>
use <../../p/1-4chrd.scad>
function ldraw_lib__s__6177741ps01() = [
// 0 ~Sticker  0.8 x  4.1 with Front Grille with Vertical Lines on Transparent Background - First Face
// 0 Name: s\6177741ps01.dat
// 0 Author: Massimo Maso [Sirio]
// 0 !LDRAW_ORG Subpart UPDATE 2025-05
// 0 !LICENSE Licensed under CC BY 4.0 : see CAreadme.txt
// 
// 0 BFC CERTIFY CCW
  [0,"BFC","CERTIFY"],
  [0,"BFC","CCW"],
// 
// 0 !HISTORY 2025-05-28 [OrionP] Official Update 2025-05
// 
// 
// 0 // Primitives
// 1 16 -6.5 -.25 3.0902 -1.5 0 0 0 1 0 0 0 1.5 1-4chrd.dat
  [1,16,-6.5,-.25,3.0902,-1.5,0,0,0,1,0,0,0,1.5, ldraw_lib__1_4chrd()],
// 1 16 6.5 -.25 3.0902 1.5 0 0 0 1 0 0 0 1.5 1-4chrd.dat
  [1,16,6.5,-.25,3.0902,1.5,0,0,0,1,0,0,0,1.5, ldraw_lib__1_4chrd()],
// 0 // Transparent faces
// 3 16 1.2 -.25 .8362 -6.5 -.25 4.5902 .5888 -.25 .7603
  [3,16,1.2,-.25,.8362,-6.5,-.25,4.5902,.5888,-.25,.7603],
// 3 16 1.2 -.25 .8362 6.5 -.25 4.5902 -6.5 -.25 4.5902
  [3,16,1.2,-.25,.8362,6.5,-.25,4.5902,-6.5,-.25,4.5902],
// 3 16 1.2 -.25 .8362 1.8991 -.25 .7365 6.5 -.25 4.5902
  [3,16,1.2,-.25,.8362,1.8991,-.25,.7365,6.5,-.25,4.5902],
// 4 16 -8 -.25 3.0902 -8 -.25 -.0144 -.7008 -.25 -.0144 -.4875 -.25 .1807
  [4,16,-8,-.25,3.0902,-8,-.25,-.0144,-.7008,-.25,-.0144,-.4875,-.25,.1807],
// 3 16 -8 -.25 3.0902 -.4875 -.25 .1807 .0147 -.25 .5373
  [3,16,-8,-.25,3.0902,-.4875,-.25,.1807,.0147,-.25,.5373],
// 4 16 -8 -.25 3.0902 .0147 -.25 .5373 .5888 -.25 .7603 -6.5 -.25 4.5902
  [4,16,-8,-.25,3.0902,.0147,-.25,.5373,.5888,-.25,.7603,-6.5,-.25,4.5902],
// 4 16 8 -.25 3.0902 6.5 -.25 4.5902 1.8991 -.25 .7365 2.5425 -.25 .4452
  [4,16,8,-.25,3.0902,6.5,-.25,4.5902,1.8991,-.25,.7365,2.5425,-.25,.4452],
// 4 16 8 -.25 3.0902 2.5425 -.25 .4452 3.0787 -.25 -.0144 8 -.25 -.0144
  [4,16,8,-.25,3.0902,2.5425,-.25,.4452,3.0787,-.25,-.0144,8,-.25,-.0144],
// 0 BFC NOCLIP
  [0,"BFC","NOCLIP"],
// 0 // Black faces
// 4 0 1.2 -.25 .8362 .5888 -.25 .7603 .0147 -.25 .5373 1.8991 -.25 .7365
  [4,0,1.2,-.25,.8362,.5888,-.25,.7603,.0147,-.25,.5373,1.8991,-.25,.7365],
// 4 0 -.4875 -.25 .1807 2.5425 -.25 .4452 1.8991 -.25 .7365 .0147 -.25 .5373
  [4,0,-.4875,-.25,.1807,2.5425,-.25,.4452,1.8991,-.25,.7365,.0147,-.25,.5373],
// 4 0 -.4875 -.25 .1807 -.7008 -.25 -.0144 3.0787 -.25 -.0144 2.5425 -.25 .4452
  [4,0,-.4875,-.25,.1807,-.7008,-.25,-.0144,3.0787,-.25,-.0144,2.5425,-.25,.4452],
];
module ldraw_lib__s__6177741ps01(step=0, col=false, unit=2/5, alt=false, line=0.2, solid=!$preview)
    makepoly(ldraw_lib__s__6177741ps01(), step=step, col=col, unit=unit, alt=alt, line=line, solid=solid);
ldraw_lib__s__6177741ps01(line=0.2);
// main file
use <../lib.scad>
use <s/6177741es11.scad>
use <s/6177741ps01.scad>
use <s/6177741ps02.scad>
use <s/6177741ps03.scad>
use <s/6177741ps04.scad>
use <s/6177741ps05.scad>
use <s/6177741ps06.scad>
function ldraw_lib__6177741pc01() = [
// 0 Sticker  0.8 x  4.1 with Front Grille with Vertical Lines on Transparent Background (Formed)
// 0 Name: 6177741pc01.dat
// 0 Author: Massimo Maso [Sirio]
// 0 !LDRAW_ORG Part UPDATE 2025-05
// 0 !LICENSE Licensed under CC BY 4.0 : see CAreadme.txt
// 
// 0 BFC CERTIFY CCW
  [0,"BFC","CERTIFY"],
  [0,"BFC","CCW"],
// 
// 0 !KEYWORDS AMG, GT3, Mercedes, Set 75877, Speed Champions
// 
// 0 !HISTORY 2025-05-28 [OrionP] Official Update 2025-05
// 
// 
// 1 16 34.436 -7.5317 0 0 -.5359 .844281 0 .844281 .5359 -1 0 0 s\6177741ps01.dat
  [1,16,34.436,-7.5317,0,0,-.5359,.844281,0,.844281,.5359,-1,0,0, ldraw_lib__s__6177741ps01()],
// 1 16 34.436 -7.5317 0 0 -.435742 .900072 0 .900072 .435742 -1 0 0 s\6177741ps02.dat
  [1,16,34.436,-7.5317,0,0,-.435742,.900072,0,.900072,.435742,-1,0,0, ldraw_lib__s__6177741ps02()],
// 1 16 21.648 -12.8828 0 0 -.336689 .941616 0 .941616 .336689 -1 0 0 s\6177741ps03.dat
  [1,16,21.648,-12.8828,0,0,-.336689,.941616,0,.941616,.336689,-1,0,0, ldraw_lib__s__6177741ps03()],
// 1 16 21.648 -12.8828 0 0 -.238478 .971148 0 .971148 .238478 -1 0 0 s\6177741ps04.dat
  [1,16,21.648,-12.8828,0,0,-.238478,.971148,0,.971148,.238478,-1,0,0, ldraw_lib__s__6177741ps04()],
// 1 16 7.384 -15.6525 0 0 -.143056 .989715 0 .989715 .143056 -1 0 0 s\6177741ps05.dat
  [1,16,7.384,-15.6525,0,0,-.143056,.989715,0,.989715,.143056,-1,0,0, ldraw_lib__s__6177741ps05()],
// 1 16 7.384 -15.6525 0 0 -.047009 .998894 0 .998894 .047009 -1 0 0 s\6177741ps06.dat
  [1,16,7.384,-15.6525,0,0,-.047009,.998894,0,.998894,.047009,-1,0,0, ldraw_lib__s__6177741ps06()],
// 1 16 -7.384 -15.6525 0 0 .047009 -.998894 0 .998894 .047009 -1 0 0 s\6177741ps06.dat
  [1,16,-7.384,-15.6525,0,0,.047009,-.998894,0,.998894,.047009,-1,0,0, ldraw_lib__s__6177741ps06()],
// 1 16 -7.384 -15.6525 0 0 .143056 -.989715 0 .989715 .143056 -1 0 0 s\6177741ps05.dat
  [1,16,-7.384,-15.6525,0,0,.143056,-.989715,0,.989715,.143056,-1,0,0, ldraw_lib__s__6177741ps05()],
// 1 16 -21.648 -12.8828 0 0 .238478 -.971148 0 .971148 .238478 -1 0 0 s\6177741ps04.dat
  [1,16,-21.648,-12.8828,0,0,.238478,-.971148,0,.971148,.238478,-1,0,0, ldraw_lib__s__6177741ps04()],
// 1 16 -21.648 -12.8828 0 0 .336689 -.941616 0 .941616 .336689 -1 0 0 s\6177741ps03.dat
  [1,16,-21.648,-12.8828,0,0,.336689,-.941616,0,.941616,.336689,-1,0,0, ldraw_lib__s__6177741ps03()],
// 1 16 -34.436 -7.5317 0 0 .435742 -.900072 0 .900072 .435742 -1 0 0 s\6177741ps02.dat
  [1,16,-34.436,-7.5317,0,0,.435742,-.900072,0,.900072,.435742,-1,0,0, ldraw_lib__s__6177741ps02()],
// 1 16 -34.436 -7.5317 0 0 .5359 -.844281 0 .844281 .5359 -1 0 0 s\6177741ps01.dat
  [1,16,-34.436,-7.5317,0,0,.5359,-.844281,0,.844281,.5359,-1,0,0, ldraw_lib__s__6177741ps01()],
// 1 16 0 0 0 0 0 1 0 1 0 -1 0 0 s\6177741es11.dat
  [1,16,0,0,0,0,0,1,0,1,0,-1,0,0, ldraw_lib__s__6177741es11()],
];
module ldraw_lib__6177741pc01(step=0, col=false, unit=2/5, alt=false, line=0.2, solid=!$preview)
    makepoly(ldraw_lib__6177741pc01(), step=step, col=col, unit=unit, alt=alt, line=line, solid=solid);
ldraw_lib__6177741pc01(line=0.2);
